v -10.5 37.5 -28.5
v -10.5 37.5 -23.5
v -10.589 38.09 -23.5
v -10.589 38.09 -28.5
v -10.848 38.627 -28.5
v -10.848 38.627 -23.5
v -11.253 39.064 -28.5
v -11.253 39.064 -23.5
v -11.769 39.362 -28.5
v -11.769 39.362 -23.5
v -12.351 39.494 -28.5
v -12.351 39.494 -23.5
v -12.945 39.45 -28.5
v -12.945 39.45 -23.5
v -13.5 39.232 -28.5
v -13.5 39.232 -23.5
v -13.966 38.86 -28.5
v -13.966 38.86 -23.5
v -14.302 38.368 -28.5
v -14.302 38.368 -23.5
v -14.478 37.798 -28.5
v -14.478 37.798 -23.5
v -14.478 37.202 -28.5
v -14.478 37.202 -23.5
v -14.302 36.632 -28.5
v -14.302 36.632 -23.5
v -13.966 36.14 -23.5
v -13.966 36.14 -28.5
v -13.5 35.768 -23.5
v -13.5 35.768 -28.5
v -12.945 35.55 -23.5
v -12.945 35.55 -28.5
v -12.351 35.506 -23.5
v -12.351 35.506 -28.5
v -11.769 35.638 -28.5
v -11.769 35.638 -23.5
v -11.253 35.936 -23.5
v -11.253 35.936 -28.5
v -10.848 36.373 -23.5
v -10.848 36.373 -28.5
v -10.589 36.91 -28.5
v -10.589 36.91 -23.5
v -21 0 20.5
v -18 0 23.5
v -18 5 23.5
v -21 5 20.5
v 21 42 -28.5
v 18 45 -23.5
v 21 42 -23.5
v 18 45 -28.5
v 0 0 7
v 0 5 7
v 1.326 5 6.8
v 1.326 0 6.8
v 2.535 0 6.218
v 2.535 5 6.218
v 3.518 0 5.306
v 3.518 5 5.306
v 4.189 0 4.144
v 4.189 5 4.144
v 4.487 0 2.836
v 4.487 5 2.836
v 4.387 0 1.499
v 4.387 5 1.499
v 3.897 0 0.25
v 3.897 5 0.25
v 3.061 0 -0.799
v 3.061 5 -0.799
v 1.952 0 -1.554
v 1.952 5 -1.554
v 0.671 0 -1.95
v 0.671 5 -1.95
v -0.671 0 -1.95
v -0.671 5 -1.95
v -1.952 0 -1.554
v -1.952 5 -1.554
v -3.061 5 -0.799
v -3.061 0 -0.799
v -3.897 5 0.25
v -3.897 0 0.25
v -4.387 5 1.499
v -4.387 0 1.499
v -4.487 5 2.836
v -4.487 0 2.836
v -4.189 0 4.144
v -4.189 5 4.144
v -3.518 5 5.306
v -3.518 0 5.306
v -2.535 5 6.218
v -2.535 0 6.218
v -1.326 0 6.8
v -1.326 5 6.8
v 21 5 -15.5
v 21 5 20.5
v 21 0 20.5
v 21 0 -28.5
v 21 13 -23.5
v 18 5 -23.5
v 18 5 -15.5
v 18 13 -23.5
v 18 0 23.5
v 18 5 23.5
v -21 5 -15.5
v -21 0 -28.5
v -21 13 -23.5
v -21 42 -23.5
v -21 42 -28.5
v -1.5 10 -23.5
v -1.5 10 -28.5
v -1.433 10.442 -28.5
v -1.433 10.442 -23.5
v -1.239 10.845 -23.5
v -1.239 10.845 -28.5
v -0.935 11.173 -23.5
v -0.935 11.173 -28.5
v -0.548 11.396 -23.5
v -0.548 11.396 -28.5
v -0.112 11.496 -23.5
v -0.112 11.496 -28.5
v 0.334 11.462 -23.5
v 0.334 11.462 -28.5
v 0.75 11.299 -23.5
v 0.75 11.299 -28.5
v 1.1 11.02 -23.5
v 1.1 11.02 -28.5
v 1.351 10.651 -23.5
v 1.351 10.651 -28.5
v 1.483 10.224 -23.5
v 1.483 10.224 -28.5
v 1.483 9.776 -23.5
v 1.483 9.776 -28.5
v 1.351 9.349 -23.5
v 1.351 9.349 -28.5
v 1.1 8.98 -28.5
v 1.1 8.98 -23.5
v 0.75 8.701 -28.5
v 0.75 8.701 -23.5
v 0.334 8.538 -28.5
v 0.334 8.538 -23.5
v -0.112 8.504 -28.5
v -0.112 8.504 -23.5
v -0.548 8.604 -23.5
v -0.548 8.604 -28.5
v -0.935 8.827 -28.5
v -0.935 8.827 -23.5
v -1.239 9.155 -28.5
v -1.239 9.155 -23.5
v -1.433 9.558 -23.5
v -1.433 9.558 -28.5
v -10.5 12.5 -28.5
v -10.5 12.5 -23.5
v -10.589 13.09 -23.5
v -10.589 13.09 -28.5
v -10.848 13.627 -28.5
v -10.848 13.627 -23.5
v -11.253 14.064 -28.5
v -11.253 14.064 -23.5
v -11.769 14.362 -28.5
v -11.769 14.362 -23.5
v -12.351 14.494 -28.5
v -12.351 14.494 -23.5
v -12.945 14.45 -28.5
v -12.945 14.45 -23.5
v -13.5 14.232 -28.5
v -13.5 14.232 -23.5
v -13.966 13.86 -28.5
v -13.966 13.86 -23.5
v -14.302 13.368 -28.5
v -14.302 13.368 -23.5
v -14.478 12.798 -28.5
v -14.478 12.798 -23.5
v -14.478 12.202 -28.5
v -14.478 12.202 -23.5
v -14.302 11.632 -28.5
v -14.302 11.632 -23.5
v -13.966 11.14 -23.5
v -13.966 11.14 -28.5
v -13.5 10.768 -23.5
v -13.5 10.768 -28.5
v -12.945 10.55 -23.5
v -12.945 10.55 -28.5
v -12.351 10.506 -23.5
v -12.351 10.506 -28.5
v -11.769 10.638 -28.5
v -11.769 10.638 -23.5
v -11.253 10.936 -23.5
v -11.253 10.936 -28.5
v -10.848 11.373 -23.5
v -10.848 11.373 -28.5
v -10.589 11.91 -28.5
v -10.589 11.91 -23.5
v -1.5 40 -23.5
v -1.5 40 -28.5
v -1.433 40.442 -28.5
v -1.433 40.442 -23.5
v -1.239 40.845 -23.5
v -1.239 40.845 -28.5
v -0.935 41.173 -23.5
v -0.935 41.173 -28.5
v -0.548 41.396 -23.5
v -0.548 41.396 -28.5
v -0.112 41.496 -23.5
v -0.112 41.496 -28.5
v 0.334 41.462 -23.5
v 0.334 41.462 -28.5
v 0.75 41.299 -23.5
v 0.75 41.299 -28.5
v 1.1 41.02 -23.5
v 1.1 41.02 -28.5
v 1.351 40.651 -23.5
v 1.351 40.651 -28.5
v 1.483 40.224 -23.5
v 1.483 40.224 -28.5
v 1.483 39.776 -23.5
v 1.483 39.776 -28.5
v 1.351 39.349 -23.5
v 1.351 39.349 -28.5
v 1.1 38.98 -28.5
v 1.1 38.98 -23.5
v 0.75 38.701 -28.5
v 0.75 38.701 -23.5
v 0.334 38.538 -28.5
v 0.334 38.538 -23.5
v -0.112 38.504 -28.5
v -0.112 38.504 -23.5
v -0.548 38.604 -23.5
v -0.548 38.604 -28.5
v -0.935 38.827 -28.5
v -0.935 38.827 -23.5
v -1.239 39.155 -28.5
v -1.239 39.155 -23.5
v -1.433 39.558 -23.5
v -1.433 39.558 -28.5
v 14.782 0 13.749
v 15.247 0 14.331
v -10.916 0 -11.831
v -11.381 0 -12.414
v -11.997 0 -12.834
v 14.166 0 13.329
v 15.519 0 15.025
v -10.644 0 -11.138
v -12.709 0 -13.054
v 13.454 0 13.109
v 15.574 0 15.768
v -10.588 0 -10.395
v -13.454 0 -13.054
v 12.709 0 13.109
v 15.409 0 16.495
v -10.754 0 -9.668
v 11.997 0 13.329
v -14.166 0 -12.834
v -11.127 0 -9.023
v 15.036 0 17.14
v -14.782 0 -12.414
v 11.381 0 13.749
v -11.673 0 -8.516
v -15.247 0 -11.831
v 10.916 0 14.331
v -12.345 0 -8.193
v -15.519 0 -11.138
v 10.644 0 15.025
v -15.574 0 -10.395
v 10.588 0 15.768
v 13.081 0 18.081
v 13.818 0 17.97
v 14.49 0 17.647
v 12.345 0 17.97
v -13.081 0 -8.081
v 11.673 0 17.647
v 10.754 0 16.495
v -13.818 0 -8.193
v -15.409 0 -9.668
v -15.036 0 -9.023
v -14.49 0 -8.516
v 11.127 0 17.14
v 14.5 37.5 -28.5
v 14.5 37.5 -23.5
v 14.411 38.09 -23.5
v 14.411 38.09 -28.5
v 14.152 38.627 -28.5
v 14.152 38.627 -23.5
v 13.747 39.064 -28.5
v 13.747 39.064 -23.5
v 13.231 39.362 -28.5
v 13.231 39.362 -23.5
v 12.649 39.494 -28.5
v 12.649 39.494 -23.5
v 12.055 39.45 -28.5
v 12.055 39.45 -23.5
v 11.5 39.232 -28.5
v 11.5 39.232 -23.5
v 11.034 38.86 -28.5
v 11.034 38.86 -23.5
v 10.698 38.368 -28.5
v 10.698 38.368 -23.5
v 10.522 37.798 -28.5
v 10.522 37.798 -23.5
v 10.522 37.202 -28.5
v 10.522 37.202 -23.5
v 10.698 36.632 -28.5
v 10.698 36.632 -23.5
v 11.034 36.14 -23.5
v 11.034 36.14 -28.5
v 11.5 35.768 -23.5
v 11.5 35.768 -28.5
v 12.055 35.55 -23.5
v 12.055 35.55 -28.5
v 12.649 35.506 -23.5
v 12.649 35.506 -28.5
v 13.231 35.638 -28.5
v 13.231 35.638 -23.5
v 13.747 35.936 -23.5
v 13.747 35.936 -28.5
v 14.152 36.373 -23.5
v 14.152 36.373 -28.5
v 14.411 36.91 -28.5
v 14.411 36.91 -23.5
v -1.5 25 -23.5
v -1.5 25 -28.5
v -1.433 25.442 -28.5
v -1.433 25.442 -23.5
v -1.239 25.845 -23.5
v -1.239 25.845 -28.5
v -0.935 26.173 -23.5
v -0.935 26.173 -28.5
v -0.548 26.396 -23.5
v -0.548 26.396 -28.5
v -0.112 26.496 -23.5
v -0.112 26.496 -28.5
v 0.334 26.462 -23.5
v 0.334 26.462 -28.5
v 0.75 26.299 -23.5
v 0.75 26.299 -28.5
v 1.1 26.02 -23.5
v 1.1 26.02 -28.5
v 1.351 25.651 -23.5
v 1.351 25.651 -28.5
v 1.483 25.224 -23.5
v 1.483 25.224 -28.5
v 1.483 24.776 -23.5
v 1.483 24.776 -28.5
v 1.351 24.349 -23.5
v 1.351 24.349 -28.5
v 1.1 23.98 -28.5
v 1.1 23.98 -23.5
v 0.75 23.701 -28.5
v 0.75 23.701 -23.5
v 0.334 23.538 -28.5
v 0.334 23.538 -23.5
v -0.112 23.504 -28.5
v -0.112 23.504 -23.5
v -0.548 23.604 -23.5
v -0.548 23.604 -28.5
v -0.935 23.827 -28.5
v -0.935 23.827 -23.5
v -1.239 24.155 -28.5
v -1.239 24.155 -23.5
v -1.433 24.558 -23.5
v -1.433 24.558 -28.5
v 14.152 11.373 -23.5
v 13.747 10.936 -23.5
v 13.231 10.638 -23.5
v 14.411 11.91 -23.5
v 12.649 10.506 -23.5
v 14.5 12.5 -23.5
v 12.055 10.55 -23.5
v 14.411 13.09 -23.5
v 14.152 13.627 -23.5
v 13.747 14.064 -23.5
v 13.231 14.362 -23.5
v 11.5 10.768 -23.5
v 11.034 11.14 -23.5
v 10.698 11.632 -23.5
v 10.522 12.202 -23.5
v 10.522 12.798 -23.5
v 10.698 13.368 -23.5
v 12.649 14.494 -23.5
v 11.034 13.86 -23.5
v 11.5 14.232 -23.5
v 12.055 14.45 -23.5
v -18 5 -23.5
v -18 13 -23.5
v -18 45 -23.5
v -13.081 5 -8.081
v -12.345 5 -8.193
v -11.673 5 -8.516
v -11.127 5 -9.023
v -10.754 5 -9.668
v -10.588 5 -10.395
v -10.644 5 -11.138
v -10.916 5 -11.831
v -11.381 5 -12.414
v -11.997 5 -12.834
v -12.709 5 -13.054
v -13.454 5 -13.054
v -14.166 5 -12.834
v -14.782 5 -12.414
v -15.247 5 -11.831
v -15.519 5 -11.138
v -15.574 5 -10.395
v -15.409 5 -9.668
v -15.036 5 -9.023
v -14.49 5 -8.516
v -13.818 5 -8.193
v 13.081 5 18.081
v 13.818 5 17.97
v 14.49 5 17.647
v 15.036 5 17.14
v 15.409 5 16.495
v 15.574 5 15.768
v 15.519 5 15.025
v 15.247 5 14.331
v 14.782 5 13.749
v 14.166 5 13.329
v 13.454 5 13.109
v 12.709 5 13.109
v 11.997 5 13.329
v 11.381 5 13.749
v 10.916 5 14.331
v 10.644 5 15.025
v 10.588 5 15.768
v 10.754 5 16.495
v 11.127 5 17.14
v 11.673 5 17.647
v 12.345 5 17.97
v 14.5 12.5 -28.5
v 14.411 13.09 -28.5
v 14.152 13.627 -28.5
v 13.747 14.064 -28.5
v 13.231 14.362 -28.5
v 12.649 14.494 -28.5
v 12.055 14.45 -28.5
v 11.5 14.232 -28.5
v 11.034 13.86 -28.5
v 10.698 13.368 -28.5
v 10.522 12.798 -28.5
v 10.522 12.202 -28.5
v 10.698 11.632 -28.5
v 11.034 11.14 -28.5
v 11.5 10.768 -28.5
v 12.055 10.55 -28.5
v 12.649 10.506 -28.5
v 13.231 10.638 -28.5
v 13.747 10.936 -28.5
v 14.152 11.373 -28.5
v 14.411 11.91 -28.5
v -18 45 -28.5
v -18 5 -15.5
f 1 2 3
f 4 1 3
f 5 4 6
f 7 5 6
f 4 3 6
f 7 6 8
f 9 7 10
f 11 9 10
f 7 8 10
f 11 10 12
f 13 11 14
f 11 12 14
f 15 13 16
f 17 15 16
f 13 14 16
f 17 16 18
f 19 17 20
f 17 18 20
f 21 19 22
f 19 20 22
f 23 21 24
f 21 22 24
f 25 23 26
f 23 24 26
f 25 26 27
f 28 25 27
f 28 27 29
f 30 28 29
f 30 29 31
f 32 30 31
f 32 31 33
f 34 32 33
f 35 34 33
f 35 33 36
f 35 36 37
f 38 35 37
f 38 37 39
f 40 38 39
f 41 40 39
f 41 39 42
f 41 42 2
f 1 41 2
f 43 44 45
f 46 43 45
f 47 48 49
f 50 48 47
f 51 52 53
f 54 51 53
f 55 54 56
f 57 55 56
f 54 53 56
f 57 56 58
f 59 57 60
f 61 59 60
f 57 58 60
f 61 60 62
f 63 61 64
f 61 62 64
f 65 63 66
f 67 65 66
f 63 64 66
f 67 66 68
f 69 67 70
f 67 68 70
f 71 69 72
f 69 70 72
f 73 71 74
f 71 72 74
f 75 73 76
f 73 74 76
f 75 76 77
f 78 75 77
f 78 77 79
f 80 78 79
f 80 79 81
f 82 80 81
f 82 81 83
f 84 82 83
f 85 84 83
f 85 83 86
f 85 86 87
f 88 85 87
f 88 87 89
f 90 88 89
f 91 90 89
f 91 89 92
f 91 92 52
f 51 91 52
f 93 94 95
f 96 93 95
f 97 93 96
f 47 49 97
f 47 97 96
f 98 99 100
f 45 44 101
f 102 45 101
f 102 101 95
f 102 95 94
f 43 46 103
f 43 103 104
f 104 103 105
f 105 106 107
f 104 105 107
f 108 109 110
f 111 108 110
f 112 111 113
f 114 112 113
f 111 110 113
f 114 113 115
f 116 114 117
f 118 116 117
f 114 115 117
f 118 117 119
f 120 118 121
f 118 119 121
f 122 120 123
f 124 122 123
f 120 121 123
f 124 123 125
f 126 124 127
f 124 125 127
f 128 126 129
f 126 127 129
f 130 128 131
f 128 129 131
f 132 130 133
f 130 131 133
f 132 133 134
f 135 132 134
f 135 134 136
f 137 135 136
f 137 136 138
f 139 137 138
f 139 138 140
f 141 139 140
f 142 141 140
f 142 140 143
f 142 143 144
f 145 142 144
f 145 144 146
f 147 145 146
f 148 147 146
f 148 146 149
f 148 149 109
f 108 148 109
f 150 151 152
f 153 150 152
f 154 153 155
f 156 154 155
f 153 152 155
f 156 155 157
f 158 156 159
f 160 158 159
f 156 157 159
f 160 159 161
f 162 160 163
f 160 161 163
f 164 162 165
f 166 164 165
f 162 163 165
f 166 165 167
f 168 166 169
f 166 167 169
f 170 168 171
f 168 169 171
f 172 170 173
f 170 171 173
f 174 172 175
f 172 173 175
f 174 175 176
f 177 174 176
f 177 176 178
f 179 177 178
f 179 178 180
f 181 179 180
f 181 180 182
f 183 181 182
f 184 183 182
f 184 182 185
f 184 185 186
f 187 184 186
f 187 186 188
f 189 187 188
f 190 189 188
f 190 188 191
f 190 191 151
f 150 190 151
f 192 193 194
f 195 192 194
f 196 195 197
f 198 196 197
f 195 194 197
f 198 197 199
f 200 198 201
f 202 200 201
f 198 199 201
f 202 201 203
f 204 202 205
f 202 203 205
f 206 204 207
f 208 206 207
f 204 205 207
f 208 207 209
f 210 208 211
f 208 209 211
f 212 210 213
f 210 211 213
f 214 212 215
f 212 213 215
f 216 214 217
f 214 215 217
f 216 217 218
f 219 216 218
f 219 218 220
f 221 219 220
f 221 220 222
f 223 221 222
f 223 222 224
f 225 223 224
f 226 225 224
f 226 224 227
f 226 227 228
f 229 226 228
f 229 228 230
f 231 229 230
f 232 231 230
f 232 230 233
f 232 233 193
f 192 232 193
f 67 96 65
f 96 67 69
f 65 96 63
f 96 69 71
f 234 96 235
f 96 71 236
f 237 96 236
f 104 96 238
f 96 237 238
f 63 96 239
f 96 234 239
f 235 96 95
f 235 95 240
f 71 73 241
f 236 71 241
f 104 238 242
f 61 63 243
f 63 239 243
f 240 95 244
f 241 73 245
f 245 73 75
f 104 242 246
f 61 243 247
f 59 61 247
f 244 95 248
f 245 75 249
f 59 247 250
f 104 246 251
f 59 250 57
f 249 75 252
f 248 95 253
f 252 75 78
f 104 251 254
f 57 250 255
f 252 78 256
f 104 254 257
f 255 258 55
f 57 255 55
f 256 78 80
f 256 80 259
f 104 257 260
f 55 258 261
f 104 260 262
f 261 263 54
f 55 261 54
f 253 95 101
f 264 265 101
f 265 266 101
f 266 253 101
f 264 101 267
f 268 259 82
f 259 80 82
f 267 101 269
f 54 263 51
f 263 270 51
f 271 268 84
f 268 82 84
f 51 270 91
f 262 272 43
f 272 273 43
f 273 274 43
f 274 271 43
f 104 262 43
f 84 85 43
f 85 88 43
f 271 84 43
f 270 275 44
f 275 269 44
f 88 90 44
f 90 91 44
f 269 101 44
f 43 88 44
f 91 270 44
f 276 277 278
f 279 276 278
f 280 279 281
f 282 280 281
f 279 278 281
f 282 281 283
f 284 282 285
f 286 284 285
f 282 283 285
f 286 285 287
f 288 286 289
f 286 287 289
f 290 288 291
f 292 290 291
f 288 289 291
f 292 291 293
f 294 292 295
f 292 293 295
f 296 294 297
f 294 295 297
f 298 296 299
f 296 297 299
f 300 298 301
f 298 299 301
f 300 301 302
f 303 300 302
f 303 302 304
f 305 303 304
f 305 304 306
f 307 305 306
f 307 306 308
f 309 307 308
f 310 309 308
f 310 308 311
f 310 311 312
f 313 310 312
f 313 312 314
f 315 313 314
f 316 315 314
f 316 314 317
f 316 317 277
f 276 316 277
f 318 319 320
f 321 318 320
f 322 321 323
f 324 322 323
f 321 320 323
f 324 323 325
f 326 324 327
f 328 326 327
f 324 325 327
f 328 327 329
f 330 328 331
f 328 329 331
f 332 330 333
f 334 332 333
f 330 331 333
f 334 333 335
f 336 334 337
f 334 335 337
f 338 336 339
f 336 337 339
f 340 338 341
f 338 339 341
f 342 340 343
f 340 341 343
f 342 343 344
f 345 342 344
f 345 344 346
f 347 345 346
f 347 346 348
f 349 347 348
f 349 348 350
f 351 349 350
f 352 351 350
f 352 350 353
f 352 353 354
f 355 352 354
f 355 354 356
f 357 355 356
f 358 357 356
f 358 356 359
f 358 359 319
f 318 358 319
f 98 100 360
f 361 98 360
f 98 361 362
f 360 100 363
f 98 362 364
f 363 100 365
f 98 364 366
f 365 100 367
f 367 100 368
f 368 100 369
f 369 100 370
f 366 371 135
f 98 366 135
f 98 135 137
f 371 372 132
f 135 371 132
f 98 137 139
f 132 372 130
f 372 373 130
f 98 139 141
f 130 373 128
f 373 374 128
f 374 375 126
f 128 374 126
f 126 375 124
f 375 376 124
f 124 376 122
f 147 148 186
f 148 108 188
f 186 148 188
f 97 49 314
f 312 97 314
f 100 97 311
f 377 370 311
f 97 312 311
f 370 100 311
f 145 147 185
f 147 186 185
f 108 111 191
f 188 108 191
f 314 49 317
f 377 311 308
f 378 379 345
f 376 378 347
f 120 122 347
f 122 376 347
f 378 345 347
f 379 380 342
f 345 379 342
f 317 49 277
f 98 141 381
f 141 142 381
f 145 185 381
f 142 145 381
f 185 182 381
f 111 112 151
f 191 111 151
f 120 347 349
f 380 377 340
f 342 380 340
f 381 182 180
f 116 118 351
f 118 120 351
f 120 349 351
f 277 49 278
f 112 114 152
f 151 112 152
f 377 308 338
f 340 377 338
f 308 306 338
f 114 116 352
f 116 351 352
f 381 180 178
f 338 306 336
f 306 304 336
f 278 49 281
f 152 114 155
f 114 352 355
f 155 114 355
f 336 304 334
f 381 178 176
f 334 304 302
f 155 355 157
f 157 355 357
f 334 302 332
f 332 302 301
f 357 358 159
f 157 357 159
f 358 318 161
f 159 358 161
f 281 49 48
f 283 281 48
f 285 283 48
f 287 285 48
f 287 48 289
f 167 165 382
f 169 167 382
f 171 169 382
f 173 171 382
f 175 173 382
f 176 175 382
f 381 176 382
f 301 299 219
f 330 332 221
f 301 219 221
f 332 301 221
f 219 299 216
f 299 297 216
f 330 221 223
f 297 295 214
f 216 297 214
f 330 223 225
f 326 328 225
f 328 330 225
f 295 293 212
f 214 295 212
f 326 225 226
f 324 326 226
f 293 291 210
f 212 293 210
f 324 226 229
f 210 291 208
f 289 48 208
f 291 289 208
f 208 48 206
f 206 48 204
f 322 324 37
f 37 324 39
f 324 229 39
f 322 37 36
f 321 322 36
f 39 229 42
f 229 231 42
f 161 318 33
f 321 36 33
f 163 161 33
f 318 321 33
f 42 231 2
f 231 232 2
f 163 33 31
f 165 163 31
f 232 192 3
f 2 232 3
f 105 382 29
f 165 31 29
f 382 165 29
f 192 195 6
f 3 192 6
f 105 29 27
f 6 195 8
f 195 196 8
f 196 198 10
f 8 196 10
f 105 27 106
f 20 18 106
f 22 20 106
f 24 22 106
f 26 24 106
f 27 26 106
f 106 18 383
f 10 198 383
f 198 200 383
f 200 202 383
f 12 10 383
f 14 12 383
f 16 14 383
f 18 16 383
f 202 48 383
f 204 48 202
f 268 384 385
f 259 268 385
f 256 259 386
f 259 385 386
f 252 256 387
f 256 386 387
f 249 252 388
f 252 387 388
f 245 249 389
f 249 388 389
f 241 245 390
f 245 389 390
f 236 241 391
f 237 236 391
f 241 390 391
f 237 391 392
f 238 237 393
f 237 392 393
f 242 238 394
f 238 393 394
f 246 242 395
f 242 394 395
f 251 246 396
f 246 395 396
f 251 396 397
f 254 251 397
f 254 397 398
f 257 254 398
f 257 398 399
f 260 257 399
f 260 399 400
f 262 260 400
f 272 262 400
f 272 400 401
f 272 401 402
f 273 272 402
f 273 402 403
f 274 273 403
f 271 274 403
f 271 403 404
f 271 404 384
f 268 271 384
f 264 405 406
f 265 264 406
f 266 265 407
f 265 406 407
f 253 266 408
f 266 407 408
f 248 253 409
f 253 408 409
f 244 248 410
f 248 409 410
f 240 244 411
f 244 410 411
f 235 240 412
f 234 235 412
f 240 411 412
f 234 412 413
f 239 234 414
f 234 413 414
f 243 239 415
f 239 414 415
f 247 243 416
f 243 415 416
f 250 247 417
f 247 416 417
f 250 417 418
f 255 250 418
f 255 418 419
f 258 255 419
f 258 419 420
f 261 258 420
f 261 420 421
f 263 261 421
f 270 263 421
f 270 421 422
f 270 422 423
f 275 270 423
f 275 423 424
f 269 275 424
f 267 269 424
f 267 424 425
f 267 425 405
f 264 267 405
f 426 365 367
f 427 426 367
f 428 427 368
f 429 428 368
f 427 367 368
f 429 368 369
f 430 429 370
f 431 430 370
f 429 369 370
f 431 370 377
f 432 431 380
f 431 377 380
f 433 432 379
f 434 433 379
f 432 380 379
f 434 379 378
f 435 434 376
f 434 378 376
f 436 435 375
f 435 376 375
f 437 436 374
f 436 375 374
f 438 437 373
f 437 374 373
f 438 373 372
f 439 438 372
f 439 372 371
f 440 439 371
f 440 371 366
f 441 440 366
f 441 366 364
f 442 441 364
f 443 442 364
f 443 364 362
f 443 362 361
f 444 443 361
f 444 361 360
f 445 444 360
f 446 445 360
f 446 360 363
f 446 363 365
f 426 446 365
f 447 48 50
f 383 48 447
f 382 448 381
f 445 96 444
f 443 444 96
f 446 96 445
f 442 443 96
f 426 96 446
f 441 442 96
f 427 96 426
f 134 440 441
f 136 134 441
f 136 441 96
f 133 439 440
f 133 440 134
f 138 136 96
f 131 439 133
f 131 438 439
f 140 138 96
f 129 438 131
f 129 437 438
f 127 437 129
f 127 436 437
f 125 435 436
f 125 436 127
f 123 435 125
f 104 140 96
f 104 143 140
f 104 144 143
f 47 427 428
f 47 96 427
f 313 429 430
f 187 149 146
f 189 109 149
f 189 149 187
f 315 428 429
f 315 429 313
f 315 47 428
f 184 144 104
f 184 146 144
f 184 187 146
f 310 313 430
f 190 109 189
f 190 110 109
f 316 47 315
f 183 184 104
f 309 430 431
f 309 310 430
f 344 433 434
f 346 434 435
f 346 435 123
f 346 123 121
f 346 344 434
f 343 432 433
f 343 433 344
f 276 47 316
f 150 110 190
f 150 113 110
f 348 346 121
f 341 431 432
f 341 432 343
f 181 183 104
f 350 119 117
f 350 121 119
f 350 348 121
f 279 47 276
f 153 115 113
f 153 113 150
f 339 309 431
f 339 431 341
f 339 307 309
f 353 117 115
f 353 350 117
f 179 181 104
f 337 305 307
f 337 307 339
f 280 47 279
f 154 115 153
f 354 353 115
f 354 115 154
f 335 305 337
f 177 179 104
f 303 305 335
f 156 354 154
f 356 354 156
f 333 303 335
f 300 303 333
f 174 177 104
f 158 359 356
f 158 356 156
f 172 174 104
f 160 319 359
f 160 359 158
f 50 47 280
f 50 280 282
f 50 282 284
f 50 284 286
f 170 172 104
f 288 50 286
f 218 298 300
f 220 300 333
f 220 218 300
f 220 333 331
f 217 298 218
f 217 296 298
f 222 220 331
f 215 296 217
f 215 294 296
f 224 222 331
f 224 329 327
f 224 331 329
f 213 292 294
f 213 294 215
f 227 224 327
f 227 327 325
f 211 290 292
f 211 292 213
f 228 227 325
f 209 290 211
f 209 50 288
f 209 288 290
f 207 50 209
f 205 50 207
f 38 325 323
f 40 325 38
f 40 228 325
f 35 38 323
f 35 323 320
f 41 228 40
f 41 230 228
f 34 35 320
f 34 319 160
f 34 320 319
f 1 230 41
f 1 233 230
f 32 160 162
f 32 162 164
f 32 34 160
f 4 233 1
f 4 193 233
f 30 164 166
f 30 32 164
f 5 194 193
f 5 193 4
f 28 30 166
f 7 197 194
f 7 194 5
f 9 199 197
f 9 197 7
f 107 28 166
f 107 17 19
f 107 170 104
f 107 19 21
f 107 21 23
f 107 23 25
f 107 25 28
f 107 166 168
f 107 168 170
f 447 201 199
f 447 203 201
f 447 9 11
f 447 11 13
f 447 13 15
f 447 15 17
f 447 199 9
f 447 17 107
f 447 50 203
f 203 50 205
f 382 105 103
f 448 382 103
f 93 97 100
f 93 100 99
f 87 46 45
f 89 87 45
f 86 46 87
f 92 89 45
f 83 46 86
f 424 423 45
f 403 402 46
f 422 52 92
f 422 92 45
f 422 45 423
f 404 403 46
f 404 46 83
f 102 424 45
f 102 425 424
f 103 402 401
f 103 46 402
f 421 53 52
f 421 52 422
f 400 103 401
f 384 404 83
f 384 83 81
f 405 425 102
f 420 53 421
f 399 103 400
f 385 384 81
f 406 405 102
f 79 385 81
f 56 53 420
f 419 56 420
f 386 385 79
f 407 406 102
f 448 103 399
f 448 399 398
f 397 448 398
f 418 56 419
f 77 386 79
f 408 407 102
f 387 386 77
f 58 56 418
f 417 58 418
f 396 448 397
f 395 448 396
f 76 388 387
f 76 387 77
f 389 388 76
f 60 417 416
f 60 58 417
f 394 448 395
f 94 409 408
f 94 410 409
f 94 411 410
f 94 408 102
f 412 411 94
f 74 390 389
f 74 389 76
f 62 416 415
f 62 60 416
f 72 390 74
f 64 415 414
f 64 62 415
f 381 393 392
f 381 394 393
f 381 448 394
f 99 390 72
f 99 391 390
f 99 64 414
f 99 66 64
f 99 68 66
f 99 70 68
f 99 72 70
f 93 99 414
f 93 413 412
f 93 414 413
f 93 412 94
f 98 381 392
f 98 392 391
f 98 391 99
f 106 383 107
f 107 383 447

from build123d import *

# Parameters (mm, degrees)
SKETCH1_W           = 42
SKETCH1_H           = 47
BOSS_EXTRUDE1_DEPTH = 5
SKETCH4_W           = 42
SKETCH4_H           = 45
BOSS_EXTRUDE2_DEPTH = 5
BOSS_EXTRUDE3_DEPTH = 3
BOSS_EXTRUDE4_DEPTH = 3
SKETCH2_R           = 2.5
SKETCH2_R_2         = 4.5
CUT_EXTRUDE1_DEPTH  = 54.415821626
SKETCH9_R           = 2
CUT_EXTRUDE4_DEPTH  = 69.373971656
CHAMFER2_SIZE       = 3
CUT_EXTRUDE5_REACH  = 73.903
SKETCH10_R          = 1.5


with BuildPart() as part:
    # Sketch1 → Boss-Extrude1 (new body)
    with BuildSketch(Plane(origin=(0, 0, 0), x_dir=(1, 0, 0), z_dir=(0, 1, 0))):
        Rectangle(SKETCH1_W, SKETCH1_H)
    extrude(amount=BOSS_EXTRUDE1_DEPTH)

    # Sketch4 → Boss-Extrude2 (add)
    with BuildSketch(Plane(origin=(0, 0, -23.5), x_dir=(-1, 0, 0), z_dir=(0, 0, -1))):
        with Locations((0, 22.5)):
            Rectangle(SKETCH4_W, SKETCH4_H)
    extrude(amount=BOSS_EXTRUDE2_DEPTH)

    # Sketch5 → Boss-Extrude3 (add)
    with BuildSketch(Plane(origin=(21, 0, 0), x_dir=(0, 0, -1), z_dir=(1, 0, 0))):
        Polygon((23.5, 13), (15.5, 5), (23.5, 5), align=None)
    extrude(amount=-BOSS_EXTRUDE3_DEPTH)

    # Sketch6 → Boss-Extrude4 (add)
    with BuildSketch(Plane.ZY.offset(21)):
        Polygon((-23.5, 13), (-15.5, 5), (-23.5, 5), align=None)
    extrude(amount=-BOSS_EXTRUDE4_DEPTH)

    # Sketch2 → Cut-Extrude1 (cut, through all)
    with BuildSketch(Plane(origin=(0, 5, 0), x_dir=(1, 0, 0), z_dir=(0, 1, 0))):
        with Locations(Location((-13.081475452, 10.581475452, 0), (0, 0, 270))):
            Circle(SKETCH2_R)
        with Locations(Location((13.081475452, -15.581475452, 0), (0, 0, 270))):
            Circle(SKETCH2_R)
        with Locations(Location((0, -2.5, 0), (0, 0, 270))):
            Circle(SKETCH2_R_2)
    extrude(amount=-CUT_EXTRUDE1_DEPTH, mode=Mode.SUBTRACT)

    # Sketch9 → Cut-Extrude4 (cut, through all)
    with BuildSketch(Plane.XY.offset(-23.5)):
        with Locations((-12.5, 37.5)):
            Circle(SKETCH9_R)
        with Locations((12.5, 37.5)):
            Circle(SKETCH9_R)
        with Locations((12.5, 12.5)):
            Circle(SKETCH9_R)
        with Locations((-12.5, 12.5)):
            Circle(SKETCH9_R)
    extrude(amount=-CUT_EXTRUDE4_DEPTH, mode=Mode.SUBTRACT)

    # Chamfer2
    chamfer2_edges = [part.edges().sort_by_distance(p)[0] for p in [
        (-21, 2.5, 23.5),
        (21, 2.5, 23.5),
        (21, 45, -26),
        (-21, 45, -26),
    ]]
    chamfer(chamfer2_edges, length=CHAMFER2_SIZE)

    # Sketch10 → Cut-Extrude5 (cut, up to next)
    with BuildSketch(Plane(origin=(0, 0, -28.5), x_dir=(-1, 0, 0), z_dir=(0, 0, -1)), mode=Mode.PRIVATE) as cut_extrude5_sk1:
        with Locations((0, 25)):
            Circle(SKETCH10_R)
    cut_extrude5_tool1 = extrude(cut_extrude5_sk1.sketch, amount=-CUT_EXTRUDE5_REACH, mode=Mode.PRIVATE) & part.part
    # Sketch10 → Cut-Extrude5 (cut, up to next)
    with BuildSketch(Plane(origin=(0, 0, -28.5), x_dir=(-1, 0, 0), z_dir=(0, 0, -1)), mode=Mode.PRIVATE) as cut_extrude5_sk2:
        with Locations((0, 10)):
            Circle(SKETCH10_R)
    cut_extrude5_tool2 = extrude(cut_extrude5_sk2.sketch, amount=-CUT_EXTRUDE5_REACH, mode=Mode.PRIVATE) & part.part
    # Sketch10 → Cut-Extrude5 (cut, up to next)
    with BuildSketch(Plane(origin=(0, 0, -28.5), x_dir=(-1, 0, 0), z_dir=(0, 0, -1)), mode=Mode.PRIVATE) as cut_extrude5_sk3:
        with Locations((0, 40)):
            Circle(SKETCH10_R)
    cut_extrude5_tool3 = extrude(cut_extrude5_sk3.sketch, amount=-CUT_EXTRUDE5_REACH, mode=Mode.PRIVATE) & part.part
    add(cut_extrude5_tool1.solids().sort_by_distance((0, 25, -28.5))[0], mode=Mode.SUBTRACT)
    add(cut_extrude5_tool2.solids().sort_by_distance((0, 10, -28.5))[0], mode=Mode.SUBTRACT)
    add(cut_extrude5_tool3.solids().sort_by_distance((0, 40, -28.5))[0], mode=Mode.SUBTRACT)


solid = part.part
